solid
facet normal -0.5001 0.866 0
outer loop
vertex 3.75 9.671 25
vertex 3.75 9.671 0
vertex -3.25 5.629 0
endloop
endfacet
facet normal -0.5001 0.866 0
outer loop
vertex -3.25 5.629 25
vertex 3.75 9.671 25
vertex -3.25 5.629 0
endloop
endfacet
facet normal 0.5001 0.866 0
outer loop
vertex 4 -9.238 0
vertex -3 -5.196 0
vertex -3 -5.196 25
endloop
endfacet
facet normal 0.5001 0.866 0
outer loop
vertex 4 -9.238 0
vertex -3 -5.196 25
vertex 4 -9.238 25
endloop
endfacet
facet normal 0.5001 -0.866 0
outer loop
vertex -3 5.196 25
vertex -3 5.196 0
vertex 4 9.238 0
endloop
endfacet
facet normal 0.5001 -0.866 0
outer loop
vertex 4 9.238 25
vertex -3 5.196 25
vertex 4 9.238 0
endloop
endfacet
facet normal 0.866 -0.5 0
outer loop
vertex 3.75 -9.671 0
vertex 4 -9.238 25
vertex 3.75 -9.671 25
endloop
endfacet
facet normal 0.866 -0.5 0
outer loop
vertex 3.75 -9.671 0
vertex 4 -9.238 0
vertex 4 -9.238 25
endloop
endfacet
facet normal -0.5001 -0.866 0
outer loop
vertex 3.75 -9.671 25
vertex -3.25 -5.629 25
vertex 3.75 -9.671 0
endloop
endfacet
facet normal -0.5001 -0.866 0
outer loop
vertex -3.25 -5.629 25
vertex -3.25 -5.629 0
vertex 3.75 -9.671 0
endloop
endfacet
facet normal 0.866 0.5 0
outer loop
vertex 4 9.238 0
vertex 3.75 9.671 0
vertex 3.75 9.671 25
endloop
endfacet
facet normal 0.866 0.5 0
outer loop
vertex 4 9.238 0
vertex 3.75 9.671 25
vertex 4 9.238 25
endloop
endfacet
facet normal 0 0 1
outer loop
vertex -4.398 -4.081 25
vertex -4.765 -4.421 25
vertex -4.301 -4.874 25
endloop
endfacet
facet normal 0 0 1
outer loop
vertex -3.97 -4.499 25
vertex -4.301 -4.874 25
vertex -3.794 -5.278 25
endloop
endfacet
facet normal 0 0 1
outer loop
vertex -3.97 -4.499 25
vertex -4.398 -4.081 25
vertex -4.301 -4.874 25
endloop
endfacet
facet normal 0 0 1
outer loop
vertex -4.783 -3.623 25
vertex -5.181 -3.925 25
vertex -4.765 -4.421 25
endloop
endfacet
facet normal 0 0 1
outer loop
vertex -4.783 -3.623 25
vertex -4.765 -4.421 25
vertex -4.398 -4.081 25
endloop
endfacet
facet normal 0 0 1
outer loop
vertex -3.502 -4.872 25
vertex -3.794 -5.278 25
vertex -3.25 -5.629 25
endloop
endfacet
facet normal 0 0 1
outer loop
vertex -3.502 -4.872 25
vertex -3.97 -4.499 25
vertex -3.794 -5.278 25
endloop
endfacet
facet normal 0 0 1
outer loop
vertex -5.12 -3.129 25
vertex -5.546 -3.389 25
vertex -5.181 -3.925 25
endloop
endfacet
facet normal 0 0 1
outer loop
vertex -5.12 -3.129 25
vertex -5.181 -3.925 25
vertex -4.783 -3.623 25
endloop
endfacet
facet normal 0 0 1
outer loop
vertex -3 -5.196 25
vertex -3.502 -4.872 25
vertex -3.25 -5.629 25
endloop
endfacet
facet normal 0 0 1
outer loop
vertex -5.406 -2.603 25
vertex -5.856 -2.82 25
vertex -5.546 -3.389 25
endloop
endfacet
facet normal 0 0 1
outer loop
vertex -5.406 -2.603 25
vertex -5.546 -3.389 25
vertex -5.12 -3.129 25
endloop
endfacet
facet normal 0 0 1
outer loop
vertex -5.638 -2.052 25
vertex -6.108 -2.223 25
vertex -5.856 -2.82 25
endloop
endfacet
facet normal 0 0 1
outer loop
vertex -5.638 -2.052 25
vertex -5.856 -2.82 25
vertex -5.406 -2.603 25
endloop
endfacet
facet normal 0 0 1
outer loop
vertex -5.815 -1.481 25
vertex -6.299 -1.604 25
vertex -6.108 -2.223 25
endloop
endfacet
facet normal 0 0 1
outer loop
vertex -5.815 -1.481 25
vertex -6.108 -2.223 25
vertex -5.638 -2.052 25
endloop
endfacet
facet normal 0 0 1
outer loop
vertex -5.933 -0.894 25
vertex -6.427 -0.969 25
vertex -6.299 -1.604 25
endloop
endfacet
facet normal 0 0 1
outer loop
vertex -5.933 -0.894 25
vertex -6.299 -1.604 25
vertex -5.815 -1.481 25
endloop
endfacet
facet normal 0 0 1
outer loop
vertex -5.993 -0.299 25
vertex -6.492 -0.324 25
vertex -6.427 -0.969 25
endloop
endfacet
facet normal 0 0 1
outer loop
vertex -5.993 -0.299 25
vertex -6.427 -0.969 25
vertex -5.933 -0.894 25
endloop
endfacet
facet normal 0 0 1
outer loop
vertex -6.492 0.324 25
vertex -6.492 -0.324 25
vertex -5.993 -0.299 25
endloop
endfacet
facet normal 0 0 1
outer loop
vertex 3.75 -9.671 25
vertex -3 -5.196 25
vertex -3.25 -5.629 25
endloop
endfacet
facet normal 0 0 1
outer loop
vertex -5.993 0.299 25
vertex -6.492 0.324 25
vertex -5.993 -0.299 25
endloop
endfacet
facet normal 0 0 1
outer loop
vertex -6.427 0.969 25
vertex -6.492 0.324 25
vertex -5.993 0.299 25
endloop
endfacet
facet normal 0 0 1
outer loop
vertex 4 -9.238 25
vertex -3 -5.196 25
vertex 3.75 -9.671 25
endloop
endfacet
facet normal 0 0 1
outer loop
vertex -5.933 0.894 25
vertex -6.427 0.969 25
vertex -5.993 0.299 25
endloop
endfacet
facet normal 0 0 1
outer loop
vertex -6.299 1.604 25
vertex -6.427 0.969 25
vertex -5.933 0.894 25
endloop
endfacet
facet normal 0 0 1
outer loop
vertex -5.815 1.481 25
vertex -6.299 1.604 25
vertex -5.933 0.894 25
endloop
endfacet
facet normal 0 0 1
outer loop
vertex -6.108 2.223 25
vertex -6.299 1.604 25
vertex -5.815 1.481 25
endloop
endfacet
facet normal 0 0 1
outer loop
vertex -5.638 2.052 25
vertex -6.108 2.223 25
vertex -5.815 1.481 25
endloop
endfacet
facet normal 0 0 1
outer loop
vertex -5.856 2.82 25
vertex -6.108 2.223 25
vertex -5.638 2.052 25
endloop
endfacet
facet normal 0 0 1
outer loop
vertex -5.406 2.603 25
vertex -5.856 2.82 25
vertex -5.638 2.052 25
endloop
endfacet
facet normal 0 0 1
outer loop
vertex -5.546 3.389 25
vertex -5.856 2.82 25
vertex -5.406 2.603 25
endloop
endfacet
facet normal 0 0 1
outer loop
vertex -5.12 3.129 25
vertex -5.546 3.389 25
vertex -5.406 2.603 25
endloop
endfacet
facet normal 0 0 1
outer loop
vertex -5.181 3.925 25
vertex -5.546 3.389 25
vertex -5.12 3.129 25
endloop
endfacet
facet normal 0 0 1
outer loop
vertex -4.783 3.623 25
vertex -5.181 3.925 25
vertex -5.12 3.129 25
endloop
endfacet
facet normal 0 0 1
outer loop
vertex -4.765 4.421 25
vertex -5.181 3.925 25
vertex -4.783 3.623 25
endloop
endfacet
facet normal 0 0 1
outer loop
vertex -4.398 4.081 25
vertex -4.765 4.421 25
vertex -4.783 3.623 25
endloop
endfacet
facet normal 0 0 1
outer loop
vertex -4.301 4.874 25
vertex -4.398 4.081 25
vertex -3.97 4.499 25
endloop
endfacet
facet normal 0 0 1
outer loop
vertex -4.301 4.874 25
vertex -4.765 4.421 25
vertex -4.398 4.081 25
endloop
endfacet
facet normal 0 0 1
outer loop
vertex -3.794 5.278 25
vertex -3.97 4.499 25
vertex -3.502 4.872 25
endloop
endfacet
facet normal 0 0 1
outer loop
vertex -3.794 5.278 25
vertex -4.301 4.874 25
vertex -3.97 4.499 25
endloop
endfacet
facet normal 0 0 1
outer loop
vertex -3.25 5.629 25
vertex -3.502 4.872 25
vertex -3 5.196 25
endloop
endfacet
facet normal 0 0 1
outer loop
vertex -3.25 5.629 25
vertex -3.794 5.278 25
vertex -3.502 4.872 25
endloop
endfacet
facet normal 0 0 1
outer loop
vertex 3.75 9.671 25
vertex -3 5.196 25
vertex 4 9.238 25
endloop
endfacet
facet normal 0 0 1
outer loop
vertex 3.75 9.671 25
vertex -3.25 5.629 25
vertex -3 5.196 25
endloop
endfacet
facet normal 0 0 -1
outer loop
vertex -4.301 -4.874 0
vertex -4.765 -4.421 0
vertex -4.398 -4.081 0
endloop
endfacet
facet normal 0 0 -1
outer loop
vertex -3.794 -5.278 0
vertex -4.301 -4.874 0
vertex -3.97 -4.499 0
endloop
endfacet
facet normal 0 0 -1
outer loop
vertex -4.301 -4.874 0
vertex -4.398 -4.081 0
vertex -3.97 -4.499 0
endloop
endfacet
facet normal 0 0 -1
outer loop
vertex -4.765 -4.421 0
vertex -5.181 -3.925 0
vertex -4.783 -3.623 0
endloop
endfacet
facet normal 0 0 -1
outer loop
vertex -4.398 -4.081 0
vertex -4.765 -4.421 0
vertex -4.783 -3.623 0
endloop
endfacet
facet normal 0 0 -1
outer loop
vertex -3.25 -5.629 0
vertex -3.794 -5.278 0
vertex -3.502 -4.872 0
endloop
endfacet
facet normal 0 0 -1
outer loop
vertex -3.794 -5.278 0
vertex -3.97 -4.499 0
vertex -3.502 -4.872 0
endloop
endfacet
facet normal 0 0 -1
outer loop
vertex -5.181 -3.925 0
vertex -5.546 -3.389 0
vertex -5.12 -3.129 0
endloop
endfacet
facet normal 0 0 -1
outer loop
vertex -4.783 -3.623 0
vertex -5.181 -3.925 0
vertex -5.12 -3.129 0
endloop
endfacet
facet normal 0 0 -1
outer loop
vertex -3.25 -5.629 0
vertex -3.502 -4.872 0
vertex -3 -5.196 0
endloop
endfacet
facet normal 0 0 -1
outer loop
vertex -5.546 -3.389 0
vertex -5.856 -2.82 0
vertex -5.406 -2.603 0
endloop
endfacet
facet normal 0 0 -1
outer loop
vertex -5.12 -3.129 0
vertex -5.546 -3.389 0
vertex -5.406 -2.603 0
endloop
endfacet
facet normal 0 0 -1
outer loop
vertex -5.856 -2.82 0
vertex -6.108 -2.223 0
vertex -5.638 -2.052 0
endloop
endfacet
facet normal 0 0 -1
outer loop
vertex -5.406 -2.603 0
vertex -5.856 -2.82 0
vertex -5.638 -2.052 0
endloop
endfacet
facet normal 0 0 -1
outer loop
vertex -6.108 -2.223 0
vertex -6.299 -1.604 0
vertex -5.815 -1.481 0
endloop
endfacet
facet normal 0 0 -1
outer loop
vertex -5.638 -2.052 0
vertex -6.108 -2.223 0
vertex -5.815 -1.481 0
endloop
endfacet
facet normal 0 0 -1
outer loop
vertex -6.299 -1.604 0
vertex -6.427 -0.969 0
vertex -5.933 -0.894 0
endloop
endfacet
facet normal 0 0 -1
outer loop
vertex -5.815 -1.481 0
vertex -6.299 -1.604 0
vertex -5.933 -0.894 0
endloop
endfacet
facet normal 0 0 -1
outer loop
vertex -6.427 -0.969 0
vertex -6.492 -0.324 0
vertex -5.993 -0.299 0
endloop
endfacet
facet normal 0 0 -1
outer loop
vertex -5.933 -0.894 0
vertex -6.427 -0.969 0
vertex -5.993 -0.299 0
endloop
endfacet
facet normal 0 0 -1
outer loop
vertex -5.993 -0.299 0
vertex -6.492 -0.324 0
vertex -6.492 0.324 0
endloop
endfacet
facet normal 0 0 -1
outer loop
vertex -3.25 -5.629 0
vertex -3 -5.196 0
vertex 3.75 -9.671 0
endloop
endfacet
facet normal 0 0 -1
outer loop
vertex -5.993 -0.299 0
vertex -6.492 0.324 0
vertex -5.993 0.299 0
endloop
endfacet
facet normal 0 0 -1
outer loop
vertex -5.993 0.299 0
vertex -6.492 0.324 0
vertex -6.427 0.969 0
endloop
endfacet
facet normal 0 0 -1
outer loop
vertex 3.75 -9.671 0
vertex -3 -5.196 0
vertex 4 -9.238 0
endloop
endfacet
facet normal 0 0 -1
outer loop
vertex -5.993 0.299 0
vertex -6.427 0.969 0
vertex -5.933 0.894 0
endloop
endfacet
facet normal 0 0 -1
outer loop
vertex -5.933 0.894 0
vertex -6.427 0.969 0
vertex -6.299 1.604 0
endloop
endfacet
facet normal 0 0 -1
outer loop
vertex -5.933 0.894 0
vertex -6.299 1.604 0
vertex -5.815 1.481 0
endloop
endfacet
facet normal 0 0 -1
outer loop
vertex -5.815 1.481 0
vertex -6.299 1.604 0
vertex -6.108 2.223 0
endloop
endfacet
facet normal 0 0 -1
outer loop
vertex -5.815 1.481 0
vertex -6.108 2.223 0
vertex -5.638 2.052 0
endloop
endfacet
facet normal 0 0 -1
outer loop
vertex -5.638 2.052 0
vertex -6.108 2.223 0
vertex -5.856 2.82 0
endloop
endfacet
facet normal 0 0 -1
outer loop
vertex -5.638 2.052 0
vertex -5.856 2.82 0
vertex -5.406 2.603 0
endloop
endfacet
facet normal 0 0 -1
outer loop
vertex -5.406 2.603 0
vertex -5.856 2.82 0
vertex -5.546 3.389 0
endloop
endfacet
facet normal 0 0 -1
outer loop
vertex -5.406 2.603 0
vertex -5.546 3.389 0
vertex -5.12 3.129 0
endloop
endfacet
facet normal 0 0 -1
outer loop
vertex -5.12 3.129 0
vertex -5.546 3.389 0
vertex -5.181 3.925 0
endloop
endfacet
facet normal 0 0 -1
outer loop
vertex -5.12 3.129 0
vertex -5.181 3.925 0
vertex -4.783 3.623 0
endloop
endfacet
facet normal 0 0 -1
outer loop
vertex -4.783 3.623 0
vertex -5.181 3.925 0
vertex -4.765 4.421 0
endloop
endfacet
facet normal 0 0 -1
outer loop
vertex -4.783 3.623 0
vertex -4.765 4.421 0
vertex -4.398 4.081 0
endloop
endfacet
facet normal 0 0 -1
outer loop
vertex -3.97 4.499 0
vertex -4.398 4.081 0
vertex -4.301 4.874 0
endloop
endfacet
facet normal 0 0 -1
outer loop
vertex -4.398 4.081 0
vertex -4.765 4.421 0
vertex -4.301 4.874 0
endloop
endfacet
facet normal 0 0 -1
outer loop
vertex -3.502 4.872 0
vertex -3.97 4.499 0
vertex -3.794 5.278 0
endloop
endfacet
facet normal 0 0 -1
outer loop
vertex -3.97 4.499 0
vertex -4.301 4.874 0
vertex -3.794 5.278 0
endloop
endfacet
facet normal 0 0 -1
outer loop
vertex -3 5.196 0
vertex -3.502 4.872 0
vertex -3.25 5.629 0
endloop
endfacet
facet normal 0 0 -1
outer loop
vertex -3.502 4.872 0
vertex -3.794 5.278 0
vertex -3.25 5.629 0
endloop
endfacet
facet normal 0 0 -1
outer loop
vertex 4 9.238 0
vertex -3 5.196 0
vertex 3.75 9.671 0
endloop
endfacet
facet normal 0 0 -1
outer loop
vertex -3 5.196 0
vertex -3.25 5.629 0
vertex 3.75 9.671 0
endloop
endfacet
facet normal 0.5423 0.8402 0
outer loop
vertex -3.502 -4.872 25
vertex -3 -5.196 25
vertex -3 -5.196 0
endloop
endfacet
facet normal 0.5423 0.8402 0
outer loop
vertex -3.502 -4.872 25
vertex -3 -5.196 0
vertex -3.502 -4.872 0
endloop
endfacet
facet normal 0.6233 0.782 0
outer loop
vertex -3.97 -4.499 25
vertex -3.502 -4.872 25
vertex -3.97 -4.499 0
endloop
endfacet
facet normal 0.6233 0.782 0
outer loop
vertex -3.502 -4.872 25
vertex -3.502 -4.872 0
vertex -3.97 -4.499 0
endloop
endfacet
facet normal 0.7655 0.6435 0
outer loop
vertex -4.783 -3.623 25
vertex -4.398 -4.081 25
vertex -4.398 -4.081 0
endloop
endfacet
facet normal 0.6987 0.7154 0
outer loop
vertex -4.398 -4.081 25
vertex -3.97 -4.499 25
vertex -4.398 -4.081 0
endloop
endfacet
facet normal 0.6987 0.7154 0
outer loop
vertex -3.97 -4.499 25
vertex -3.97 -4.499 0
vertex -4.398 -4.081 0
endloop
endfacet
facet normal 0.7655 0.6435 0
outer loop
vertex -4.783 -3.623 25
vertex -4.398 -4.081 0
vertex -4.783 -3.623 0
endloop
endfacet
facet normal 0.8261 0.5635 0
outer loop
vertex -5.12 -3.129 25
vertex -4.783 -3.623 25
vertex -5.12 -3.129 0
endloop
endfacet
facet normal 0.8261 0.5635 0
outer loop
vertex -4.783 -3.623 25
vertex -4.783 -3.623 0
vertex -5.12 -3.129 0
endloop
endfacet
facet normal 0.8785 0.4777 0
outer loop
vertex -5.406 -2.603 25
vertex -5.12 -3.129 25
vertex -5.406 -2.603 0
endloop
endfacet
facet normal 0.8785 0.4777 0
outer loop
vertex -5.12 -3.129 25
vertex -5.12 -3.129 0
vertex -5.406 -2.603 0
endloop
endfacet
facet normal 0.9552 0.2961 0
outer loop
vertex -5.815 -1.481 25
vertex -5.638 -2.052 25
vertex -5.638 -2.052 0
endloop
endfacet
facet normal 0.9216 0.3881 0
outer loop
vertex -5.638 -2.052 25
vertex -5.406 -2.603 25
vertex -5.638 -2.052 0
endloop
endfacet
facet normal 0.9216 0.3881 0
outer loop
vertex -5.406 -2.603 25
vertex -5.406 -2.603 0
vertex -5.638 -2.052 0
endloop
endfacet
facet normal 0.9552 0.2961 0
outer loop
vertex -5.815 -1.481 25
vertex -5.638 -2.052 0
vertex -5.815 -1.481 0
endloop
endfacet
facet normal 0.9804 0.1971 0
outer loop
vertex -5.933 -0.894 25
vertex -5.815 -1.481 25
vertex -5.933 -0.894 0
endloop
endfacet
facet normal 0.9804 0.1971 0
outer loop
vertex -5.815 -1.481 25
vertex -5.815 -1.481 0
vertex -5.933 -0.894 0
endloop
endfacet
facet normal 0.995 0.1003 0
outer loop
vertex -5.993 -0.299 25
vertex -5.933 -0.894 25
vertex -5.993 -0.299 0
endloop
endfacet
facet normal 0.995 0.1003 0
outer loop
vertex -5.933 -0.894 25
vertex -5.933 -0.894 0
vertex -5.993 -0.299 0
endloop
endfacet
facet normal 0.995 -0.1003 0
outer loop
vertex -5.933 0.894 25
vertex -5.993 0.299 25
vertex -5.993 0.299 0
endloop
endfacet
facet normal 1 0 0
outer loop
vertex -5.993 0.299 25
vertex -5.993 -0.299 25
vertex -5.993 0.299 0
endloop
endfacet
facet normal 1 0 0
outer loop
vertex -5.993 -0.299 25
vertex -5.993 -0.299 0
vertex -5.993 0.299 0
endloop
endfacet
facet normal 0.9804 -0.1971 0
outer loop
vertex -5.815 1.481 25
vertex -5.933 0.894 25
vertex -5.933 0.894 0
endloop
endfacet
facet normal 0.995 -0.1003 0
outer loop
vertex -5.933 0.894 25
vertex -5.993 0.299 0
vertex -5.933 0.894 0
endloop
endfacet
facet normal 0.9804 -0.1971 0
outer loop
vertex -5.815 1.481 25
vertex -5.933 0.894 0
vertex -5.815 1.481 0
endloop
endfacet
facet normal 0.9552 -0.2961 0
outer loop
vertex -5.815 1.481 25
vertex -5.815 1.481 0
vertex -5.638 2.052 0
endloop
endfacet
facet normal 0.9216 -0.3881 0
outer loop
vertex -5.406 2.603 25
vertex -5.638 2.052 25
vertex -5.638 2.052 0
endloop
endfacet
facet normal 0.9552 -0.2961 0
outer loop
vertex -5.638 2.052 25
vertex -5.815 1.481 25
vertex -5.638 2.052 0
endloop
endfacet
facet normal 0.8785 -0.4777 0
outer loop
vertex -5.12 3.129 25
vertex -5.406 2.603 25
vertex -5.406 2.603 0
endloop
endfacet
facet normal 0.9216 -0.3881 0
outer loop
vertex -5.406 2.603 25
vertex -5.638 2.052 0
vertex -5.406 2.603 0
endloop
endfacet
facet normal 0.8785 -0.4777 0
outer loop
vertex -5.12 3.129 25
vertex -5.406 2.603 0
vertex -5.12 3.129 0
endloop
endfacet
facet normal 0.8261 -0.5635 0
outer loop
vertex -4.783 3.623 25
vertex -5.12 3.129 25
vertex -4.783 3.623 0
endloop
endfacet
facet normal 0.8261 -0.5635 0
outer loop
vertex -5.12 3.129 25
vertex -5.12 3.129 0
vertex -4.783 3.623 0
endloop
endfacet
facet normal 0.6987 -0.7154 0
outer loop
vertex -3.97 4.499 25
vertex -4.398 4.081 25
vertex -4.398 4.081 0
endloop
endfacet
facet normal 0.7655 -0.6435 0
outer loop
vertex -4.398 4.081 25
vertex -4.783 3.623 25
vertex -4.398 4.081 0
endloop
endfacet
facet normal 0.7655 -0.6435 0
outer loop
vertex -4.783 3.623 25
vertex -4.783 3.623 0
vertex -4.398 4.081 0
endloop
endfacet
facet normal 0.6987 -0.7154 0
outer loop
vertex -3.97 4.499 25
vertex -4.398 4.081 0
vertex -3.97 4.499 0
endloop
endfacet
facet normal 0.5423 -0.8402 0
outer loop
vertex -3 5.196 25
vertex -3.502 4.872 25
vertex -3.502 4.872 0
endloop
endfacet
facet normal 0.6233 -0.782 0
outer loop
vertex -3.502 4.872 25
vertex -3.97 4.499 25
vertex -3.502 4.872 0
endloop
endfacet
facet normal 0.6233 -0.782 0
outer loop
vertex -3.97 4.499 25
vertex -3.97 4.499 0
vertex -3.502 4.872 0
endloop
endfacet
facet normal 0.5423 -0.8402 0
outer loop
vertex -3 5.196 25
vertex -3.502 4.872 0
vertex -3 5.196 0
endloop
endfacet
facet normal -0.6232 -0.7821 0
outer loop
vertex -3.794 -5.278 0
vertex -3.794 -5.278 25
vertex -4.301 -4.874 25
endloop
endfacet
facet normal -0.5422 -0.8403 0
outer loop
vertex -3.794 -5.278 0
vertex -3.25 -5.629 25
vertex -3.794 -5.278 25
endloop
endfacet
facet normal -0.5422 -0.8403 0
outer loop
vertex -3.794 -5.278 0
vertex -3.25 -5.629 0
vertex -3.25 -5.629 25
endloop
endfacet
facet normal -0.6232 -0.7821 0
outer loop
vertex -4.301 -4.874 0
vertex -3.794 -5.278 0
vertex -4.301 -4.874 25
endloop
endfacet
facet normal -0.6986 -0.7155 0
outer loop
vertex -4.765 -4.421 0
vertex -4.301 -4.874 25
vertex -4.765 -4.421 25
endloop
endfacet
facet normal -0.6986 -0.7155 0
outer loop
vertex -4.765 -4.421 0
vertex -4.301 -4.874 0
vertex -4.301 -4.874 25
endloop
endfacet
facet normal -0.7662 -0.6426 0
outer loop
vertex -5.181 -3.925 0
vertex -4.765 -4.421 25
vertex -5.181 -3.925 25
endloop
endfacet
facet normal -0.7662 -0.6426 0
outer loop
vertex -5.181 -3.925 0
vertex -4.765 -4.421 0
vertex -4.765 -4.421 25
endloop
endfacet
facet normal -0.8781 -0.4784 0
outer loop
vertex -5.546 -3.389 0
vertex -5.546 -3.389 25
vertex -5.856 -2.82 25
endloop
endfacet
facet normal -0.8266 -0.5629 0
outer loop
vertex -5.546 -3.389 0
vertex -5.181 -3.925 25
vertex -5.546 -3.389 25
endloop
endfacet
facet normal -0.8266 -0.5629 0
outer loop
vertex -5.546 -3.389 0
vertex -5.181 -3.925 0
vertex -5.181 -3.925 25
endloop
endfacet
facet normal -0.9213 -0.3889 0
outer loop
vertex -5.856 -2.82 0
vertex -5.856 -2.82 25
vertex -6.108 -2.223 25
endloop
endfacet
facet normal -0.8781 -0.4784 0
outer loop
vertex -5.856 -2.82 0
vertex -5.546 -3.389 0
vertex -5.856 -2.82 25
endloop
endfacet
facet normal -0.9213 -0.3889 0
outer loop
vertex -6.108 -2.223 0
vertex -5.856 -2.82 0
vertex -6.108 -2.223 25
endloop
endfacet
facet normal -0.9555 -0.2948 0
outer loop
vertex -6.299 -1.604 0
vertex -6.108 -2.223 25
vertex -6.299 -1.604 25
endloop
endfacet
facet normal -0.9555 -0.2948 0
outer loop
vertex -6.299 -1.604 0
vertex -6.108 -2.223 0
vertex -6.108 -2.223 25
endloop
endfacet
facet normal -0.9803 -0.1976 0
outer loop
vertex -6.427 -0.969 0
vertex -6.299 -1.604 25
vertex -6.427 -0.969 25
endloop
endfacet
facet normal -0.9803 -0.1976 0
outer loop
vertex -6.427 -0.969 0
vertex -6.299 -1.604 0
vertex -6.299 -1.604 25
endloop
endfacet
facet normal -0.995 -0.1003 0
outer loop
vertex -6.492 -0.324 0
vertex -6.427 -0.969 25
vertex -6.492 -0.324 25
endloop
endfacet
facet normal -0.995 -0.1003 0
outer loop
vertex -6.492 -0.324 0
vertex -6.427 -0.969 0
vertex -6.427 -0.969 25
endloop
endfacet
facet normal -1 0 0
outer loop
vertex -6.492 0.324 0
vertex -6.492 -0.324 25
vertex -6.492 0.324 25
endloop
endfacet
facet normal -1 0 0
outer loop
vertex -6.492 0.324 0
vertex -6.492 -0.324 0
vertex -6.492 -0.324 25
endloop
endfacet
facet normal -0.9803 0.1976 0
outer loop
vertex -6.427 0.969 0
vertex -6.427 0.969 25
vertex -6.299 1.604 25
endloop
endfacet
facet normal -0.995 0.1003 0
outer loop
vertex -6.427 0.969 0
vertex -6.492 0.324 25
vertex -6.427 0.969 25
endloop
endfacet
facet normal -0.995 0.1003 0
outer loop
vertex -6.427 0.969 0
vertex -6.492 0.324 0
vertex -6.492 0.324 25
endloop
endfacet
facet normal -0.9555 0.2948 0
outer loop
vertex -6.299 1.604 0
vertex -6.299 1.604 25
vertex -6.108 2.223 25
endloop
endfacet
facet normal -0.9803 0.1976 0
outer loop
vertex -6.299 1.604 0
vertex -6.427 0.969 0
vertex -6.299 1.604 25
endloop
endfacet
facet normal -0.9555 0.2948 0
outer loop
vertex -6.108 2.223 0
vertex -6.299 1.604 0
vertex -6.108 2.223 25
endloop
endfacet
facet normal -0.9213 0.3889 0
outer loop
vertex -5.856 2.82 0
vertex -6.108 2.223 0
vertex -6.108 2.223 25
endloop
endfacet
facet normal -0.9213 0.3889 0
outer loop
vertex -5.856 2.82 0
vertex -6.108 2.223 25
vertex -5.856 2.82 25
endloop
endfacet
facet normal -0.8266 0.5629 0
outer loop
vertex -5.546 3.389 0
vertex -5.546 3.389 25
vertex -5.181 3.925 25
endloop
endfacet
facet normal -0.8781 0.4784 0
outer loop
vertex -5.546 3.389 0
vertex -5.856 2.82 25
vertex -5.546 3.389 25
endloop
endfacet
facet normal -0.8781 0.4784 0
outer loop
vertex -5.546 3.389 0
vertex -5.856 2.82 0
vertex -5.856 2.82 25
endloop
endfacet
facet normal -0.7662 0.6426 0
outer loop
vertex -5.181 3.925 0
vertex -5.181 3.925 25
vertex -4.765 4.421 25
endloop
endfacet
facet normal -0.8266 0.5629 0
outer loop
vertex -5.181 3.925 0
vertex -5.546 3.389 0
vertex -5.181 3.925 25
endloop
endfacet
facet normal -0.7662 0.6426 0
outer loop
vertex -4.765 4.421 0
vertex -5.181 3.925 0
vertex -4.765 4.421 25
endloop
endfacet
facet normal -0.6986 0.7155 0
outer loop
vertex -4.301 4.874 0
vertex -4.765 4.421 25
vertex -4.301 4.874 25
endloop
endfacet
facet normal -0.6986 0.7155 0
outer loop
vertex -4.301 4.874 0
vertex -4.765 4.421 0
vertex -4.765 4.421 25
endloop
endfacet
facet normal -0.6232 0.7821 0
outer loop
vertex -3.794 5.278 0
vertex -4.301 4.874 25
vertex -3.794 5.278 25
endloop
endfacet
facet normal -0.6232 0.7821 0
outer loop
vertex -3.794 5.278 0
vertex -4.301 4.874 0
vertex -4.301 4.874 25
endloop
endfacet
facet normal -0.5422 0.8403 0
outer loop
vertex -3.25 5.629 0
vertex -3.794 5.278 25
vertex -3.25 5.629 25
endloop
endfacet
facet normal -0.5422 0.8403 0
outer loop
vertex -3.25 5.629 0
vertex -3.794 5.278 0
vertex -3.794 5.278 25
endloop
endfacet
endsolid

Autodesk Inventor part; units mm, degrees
ref_plane "YZ Plane" through (0, 0, 0) normal (1, 0, 0) x (0, 1, 0)
ref_plane "XZ Plane" through (0, 0, 0) normal (0, 1, 0) x (-1, 0, 0)
ref_plane "XY Plane" through (0, 0, 0) normal (0, 0, 1) x (1, 0, 0)
sketch "Sketch1" plane through (0, 0, 0) normal (0, 0, 1) x (1, 0, 0)
  arc A0 (-3, 5.1962) -> (-3, -5.1962) centre (0, 0) ccw
  line L0 (-3, 5.1962) -> (4, 9.2376)
  line L1 (-3, -5.1962) -> (4, -9.2376)
  line L2 (0, 0) -> (4, 0)
  line L3 (3.75, 9.6706) -> (-3.25, 5.6292)
  arc A1 (-3.25, 5.6292) -> (-3.25, -5.6292) centre (0, 0) ccw
  line L4 (-3.25, -5.6292) -> (3.75, -9.6706)
  line L5 (3.75, 9.6706) -> (4, 9.2376)
  line L6 (4, -9.2376) -> (3.75, -9.6706)
  dimension "d0" = 12
  dimension "d1" = 4
  dimension "d2" = 60
  dimension "d3" = 0.5
extrude "Extrusion1" add sketch "Sketch1" along normal blind 25
properties part number "preanode-screen" material "Stainless Steel"
